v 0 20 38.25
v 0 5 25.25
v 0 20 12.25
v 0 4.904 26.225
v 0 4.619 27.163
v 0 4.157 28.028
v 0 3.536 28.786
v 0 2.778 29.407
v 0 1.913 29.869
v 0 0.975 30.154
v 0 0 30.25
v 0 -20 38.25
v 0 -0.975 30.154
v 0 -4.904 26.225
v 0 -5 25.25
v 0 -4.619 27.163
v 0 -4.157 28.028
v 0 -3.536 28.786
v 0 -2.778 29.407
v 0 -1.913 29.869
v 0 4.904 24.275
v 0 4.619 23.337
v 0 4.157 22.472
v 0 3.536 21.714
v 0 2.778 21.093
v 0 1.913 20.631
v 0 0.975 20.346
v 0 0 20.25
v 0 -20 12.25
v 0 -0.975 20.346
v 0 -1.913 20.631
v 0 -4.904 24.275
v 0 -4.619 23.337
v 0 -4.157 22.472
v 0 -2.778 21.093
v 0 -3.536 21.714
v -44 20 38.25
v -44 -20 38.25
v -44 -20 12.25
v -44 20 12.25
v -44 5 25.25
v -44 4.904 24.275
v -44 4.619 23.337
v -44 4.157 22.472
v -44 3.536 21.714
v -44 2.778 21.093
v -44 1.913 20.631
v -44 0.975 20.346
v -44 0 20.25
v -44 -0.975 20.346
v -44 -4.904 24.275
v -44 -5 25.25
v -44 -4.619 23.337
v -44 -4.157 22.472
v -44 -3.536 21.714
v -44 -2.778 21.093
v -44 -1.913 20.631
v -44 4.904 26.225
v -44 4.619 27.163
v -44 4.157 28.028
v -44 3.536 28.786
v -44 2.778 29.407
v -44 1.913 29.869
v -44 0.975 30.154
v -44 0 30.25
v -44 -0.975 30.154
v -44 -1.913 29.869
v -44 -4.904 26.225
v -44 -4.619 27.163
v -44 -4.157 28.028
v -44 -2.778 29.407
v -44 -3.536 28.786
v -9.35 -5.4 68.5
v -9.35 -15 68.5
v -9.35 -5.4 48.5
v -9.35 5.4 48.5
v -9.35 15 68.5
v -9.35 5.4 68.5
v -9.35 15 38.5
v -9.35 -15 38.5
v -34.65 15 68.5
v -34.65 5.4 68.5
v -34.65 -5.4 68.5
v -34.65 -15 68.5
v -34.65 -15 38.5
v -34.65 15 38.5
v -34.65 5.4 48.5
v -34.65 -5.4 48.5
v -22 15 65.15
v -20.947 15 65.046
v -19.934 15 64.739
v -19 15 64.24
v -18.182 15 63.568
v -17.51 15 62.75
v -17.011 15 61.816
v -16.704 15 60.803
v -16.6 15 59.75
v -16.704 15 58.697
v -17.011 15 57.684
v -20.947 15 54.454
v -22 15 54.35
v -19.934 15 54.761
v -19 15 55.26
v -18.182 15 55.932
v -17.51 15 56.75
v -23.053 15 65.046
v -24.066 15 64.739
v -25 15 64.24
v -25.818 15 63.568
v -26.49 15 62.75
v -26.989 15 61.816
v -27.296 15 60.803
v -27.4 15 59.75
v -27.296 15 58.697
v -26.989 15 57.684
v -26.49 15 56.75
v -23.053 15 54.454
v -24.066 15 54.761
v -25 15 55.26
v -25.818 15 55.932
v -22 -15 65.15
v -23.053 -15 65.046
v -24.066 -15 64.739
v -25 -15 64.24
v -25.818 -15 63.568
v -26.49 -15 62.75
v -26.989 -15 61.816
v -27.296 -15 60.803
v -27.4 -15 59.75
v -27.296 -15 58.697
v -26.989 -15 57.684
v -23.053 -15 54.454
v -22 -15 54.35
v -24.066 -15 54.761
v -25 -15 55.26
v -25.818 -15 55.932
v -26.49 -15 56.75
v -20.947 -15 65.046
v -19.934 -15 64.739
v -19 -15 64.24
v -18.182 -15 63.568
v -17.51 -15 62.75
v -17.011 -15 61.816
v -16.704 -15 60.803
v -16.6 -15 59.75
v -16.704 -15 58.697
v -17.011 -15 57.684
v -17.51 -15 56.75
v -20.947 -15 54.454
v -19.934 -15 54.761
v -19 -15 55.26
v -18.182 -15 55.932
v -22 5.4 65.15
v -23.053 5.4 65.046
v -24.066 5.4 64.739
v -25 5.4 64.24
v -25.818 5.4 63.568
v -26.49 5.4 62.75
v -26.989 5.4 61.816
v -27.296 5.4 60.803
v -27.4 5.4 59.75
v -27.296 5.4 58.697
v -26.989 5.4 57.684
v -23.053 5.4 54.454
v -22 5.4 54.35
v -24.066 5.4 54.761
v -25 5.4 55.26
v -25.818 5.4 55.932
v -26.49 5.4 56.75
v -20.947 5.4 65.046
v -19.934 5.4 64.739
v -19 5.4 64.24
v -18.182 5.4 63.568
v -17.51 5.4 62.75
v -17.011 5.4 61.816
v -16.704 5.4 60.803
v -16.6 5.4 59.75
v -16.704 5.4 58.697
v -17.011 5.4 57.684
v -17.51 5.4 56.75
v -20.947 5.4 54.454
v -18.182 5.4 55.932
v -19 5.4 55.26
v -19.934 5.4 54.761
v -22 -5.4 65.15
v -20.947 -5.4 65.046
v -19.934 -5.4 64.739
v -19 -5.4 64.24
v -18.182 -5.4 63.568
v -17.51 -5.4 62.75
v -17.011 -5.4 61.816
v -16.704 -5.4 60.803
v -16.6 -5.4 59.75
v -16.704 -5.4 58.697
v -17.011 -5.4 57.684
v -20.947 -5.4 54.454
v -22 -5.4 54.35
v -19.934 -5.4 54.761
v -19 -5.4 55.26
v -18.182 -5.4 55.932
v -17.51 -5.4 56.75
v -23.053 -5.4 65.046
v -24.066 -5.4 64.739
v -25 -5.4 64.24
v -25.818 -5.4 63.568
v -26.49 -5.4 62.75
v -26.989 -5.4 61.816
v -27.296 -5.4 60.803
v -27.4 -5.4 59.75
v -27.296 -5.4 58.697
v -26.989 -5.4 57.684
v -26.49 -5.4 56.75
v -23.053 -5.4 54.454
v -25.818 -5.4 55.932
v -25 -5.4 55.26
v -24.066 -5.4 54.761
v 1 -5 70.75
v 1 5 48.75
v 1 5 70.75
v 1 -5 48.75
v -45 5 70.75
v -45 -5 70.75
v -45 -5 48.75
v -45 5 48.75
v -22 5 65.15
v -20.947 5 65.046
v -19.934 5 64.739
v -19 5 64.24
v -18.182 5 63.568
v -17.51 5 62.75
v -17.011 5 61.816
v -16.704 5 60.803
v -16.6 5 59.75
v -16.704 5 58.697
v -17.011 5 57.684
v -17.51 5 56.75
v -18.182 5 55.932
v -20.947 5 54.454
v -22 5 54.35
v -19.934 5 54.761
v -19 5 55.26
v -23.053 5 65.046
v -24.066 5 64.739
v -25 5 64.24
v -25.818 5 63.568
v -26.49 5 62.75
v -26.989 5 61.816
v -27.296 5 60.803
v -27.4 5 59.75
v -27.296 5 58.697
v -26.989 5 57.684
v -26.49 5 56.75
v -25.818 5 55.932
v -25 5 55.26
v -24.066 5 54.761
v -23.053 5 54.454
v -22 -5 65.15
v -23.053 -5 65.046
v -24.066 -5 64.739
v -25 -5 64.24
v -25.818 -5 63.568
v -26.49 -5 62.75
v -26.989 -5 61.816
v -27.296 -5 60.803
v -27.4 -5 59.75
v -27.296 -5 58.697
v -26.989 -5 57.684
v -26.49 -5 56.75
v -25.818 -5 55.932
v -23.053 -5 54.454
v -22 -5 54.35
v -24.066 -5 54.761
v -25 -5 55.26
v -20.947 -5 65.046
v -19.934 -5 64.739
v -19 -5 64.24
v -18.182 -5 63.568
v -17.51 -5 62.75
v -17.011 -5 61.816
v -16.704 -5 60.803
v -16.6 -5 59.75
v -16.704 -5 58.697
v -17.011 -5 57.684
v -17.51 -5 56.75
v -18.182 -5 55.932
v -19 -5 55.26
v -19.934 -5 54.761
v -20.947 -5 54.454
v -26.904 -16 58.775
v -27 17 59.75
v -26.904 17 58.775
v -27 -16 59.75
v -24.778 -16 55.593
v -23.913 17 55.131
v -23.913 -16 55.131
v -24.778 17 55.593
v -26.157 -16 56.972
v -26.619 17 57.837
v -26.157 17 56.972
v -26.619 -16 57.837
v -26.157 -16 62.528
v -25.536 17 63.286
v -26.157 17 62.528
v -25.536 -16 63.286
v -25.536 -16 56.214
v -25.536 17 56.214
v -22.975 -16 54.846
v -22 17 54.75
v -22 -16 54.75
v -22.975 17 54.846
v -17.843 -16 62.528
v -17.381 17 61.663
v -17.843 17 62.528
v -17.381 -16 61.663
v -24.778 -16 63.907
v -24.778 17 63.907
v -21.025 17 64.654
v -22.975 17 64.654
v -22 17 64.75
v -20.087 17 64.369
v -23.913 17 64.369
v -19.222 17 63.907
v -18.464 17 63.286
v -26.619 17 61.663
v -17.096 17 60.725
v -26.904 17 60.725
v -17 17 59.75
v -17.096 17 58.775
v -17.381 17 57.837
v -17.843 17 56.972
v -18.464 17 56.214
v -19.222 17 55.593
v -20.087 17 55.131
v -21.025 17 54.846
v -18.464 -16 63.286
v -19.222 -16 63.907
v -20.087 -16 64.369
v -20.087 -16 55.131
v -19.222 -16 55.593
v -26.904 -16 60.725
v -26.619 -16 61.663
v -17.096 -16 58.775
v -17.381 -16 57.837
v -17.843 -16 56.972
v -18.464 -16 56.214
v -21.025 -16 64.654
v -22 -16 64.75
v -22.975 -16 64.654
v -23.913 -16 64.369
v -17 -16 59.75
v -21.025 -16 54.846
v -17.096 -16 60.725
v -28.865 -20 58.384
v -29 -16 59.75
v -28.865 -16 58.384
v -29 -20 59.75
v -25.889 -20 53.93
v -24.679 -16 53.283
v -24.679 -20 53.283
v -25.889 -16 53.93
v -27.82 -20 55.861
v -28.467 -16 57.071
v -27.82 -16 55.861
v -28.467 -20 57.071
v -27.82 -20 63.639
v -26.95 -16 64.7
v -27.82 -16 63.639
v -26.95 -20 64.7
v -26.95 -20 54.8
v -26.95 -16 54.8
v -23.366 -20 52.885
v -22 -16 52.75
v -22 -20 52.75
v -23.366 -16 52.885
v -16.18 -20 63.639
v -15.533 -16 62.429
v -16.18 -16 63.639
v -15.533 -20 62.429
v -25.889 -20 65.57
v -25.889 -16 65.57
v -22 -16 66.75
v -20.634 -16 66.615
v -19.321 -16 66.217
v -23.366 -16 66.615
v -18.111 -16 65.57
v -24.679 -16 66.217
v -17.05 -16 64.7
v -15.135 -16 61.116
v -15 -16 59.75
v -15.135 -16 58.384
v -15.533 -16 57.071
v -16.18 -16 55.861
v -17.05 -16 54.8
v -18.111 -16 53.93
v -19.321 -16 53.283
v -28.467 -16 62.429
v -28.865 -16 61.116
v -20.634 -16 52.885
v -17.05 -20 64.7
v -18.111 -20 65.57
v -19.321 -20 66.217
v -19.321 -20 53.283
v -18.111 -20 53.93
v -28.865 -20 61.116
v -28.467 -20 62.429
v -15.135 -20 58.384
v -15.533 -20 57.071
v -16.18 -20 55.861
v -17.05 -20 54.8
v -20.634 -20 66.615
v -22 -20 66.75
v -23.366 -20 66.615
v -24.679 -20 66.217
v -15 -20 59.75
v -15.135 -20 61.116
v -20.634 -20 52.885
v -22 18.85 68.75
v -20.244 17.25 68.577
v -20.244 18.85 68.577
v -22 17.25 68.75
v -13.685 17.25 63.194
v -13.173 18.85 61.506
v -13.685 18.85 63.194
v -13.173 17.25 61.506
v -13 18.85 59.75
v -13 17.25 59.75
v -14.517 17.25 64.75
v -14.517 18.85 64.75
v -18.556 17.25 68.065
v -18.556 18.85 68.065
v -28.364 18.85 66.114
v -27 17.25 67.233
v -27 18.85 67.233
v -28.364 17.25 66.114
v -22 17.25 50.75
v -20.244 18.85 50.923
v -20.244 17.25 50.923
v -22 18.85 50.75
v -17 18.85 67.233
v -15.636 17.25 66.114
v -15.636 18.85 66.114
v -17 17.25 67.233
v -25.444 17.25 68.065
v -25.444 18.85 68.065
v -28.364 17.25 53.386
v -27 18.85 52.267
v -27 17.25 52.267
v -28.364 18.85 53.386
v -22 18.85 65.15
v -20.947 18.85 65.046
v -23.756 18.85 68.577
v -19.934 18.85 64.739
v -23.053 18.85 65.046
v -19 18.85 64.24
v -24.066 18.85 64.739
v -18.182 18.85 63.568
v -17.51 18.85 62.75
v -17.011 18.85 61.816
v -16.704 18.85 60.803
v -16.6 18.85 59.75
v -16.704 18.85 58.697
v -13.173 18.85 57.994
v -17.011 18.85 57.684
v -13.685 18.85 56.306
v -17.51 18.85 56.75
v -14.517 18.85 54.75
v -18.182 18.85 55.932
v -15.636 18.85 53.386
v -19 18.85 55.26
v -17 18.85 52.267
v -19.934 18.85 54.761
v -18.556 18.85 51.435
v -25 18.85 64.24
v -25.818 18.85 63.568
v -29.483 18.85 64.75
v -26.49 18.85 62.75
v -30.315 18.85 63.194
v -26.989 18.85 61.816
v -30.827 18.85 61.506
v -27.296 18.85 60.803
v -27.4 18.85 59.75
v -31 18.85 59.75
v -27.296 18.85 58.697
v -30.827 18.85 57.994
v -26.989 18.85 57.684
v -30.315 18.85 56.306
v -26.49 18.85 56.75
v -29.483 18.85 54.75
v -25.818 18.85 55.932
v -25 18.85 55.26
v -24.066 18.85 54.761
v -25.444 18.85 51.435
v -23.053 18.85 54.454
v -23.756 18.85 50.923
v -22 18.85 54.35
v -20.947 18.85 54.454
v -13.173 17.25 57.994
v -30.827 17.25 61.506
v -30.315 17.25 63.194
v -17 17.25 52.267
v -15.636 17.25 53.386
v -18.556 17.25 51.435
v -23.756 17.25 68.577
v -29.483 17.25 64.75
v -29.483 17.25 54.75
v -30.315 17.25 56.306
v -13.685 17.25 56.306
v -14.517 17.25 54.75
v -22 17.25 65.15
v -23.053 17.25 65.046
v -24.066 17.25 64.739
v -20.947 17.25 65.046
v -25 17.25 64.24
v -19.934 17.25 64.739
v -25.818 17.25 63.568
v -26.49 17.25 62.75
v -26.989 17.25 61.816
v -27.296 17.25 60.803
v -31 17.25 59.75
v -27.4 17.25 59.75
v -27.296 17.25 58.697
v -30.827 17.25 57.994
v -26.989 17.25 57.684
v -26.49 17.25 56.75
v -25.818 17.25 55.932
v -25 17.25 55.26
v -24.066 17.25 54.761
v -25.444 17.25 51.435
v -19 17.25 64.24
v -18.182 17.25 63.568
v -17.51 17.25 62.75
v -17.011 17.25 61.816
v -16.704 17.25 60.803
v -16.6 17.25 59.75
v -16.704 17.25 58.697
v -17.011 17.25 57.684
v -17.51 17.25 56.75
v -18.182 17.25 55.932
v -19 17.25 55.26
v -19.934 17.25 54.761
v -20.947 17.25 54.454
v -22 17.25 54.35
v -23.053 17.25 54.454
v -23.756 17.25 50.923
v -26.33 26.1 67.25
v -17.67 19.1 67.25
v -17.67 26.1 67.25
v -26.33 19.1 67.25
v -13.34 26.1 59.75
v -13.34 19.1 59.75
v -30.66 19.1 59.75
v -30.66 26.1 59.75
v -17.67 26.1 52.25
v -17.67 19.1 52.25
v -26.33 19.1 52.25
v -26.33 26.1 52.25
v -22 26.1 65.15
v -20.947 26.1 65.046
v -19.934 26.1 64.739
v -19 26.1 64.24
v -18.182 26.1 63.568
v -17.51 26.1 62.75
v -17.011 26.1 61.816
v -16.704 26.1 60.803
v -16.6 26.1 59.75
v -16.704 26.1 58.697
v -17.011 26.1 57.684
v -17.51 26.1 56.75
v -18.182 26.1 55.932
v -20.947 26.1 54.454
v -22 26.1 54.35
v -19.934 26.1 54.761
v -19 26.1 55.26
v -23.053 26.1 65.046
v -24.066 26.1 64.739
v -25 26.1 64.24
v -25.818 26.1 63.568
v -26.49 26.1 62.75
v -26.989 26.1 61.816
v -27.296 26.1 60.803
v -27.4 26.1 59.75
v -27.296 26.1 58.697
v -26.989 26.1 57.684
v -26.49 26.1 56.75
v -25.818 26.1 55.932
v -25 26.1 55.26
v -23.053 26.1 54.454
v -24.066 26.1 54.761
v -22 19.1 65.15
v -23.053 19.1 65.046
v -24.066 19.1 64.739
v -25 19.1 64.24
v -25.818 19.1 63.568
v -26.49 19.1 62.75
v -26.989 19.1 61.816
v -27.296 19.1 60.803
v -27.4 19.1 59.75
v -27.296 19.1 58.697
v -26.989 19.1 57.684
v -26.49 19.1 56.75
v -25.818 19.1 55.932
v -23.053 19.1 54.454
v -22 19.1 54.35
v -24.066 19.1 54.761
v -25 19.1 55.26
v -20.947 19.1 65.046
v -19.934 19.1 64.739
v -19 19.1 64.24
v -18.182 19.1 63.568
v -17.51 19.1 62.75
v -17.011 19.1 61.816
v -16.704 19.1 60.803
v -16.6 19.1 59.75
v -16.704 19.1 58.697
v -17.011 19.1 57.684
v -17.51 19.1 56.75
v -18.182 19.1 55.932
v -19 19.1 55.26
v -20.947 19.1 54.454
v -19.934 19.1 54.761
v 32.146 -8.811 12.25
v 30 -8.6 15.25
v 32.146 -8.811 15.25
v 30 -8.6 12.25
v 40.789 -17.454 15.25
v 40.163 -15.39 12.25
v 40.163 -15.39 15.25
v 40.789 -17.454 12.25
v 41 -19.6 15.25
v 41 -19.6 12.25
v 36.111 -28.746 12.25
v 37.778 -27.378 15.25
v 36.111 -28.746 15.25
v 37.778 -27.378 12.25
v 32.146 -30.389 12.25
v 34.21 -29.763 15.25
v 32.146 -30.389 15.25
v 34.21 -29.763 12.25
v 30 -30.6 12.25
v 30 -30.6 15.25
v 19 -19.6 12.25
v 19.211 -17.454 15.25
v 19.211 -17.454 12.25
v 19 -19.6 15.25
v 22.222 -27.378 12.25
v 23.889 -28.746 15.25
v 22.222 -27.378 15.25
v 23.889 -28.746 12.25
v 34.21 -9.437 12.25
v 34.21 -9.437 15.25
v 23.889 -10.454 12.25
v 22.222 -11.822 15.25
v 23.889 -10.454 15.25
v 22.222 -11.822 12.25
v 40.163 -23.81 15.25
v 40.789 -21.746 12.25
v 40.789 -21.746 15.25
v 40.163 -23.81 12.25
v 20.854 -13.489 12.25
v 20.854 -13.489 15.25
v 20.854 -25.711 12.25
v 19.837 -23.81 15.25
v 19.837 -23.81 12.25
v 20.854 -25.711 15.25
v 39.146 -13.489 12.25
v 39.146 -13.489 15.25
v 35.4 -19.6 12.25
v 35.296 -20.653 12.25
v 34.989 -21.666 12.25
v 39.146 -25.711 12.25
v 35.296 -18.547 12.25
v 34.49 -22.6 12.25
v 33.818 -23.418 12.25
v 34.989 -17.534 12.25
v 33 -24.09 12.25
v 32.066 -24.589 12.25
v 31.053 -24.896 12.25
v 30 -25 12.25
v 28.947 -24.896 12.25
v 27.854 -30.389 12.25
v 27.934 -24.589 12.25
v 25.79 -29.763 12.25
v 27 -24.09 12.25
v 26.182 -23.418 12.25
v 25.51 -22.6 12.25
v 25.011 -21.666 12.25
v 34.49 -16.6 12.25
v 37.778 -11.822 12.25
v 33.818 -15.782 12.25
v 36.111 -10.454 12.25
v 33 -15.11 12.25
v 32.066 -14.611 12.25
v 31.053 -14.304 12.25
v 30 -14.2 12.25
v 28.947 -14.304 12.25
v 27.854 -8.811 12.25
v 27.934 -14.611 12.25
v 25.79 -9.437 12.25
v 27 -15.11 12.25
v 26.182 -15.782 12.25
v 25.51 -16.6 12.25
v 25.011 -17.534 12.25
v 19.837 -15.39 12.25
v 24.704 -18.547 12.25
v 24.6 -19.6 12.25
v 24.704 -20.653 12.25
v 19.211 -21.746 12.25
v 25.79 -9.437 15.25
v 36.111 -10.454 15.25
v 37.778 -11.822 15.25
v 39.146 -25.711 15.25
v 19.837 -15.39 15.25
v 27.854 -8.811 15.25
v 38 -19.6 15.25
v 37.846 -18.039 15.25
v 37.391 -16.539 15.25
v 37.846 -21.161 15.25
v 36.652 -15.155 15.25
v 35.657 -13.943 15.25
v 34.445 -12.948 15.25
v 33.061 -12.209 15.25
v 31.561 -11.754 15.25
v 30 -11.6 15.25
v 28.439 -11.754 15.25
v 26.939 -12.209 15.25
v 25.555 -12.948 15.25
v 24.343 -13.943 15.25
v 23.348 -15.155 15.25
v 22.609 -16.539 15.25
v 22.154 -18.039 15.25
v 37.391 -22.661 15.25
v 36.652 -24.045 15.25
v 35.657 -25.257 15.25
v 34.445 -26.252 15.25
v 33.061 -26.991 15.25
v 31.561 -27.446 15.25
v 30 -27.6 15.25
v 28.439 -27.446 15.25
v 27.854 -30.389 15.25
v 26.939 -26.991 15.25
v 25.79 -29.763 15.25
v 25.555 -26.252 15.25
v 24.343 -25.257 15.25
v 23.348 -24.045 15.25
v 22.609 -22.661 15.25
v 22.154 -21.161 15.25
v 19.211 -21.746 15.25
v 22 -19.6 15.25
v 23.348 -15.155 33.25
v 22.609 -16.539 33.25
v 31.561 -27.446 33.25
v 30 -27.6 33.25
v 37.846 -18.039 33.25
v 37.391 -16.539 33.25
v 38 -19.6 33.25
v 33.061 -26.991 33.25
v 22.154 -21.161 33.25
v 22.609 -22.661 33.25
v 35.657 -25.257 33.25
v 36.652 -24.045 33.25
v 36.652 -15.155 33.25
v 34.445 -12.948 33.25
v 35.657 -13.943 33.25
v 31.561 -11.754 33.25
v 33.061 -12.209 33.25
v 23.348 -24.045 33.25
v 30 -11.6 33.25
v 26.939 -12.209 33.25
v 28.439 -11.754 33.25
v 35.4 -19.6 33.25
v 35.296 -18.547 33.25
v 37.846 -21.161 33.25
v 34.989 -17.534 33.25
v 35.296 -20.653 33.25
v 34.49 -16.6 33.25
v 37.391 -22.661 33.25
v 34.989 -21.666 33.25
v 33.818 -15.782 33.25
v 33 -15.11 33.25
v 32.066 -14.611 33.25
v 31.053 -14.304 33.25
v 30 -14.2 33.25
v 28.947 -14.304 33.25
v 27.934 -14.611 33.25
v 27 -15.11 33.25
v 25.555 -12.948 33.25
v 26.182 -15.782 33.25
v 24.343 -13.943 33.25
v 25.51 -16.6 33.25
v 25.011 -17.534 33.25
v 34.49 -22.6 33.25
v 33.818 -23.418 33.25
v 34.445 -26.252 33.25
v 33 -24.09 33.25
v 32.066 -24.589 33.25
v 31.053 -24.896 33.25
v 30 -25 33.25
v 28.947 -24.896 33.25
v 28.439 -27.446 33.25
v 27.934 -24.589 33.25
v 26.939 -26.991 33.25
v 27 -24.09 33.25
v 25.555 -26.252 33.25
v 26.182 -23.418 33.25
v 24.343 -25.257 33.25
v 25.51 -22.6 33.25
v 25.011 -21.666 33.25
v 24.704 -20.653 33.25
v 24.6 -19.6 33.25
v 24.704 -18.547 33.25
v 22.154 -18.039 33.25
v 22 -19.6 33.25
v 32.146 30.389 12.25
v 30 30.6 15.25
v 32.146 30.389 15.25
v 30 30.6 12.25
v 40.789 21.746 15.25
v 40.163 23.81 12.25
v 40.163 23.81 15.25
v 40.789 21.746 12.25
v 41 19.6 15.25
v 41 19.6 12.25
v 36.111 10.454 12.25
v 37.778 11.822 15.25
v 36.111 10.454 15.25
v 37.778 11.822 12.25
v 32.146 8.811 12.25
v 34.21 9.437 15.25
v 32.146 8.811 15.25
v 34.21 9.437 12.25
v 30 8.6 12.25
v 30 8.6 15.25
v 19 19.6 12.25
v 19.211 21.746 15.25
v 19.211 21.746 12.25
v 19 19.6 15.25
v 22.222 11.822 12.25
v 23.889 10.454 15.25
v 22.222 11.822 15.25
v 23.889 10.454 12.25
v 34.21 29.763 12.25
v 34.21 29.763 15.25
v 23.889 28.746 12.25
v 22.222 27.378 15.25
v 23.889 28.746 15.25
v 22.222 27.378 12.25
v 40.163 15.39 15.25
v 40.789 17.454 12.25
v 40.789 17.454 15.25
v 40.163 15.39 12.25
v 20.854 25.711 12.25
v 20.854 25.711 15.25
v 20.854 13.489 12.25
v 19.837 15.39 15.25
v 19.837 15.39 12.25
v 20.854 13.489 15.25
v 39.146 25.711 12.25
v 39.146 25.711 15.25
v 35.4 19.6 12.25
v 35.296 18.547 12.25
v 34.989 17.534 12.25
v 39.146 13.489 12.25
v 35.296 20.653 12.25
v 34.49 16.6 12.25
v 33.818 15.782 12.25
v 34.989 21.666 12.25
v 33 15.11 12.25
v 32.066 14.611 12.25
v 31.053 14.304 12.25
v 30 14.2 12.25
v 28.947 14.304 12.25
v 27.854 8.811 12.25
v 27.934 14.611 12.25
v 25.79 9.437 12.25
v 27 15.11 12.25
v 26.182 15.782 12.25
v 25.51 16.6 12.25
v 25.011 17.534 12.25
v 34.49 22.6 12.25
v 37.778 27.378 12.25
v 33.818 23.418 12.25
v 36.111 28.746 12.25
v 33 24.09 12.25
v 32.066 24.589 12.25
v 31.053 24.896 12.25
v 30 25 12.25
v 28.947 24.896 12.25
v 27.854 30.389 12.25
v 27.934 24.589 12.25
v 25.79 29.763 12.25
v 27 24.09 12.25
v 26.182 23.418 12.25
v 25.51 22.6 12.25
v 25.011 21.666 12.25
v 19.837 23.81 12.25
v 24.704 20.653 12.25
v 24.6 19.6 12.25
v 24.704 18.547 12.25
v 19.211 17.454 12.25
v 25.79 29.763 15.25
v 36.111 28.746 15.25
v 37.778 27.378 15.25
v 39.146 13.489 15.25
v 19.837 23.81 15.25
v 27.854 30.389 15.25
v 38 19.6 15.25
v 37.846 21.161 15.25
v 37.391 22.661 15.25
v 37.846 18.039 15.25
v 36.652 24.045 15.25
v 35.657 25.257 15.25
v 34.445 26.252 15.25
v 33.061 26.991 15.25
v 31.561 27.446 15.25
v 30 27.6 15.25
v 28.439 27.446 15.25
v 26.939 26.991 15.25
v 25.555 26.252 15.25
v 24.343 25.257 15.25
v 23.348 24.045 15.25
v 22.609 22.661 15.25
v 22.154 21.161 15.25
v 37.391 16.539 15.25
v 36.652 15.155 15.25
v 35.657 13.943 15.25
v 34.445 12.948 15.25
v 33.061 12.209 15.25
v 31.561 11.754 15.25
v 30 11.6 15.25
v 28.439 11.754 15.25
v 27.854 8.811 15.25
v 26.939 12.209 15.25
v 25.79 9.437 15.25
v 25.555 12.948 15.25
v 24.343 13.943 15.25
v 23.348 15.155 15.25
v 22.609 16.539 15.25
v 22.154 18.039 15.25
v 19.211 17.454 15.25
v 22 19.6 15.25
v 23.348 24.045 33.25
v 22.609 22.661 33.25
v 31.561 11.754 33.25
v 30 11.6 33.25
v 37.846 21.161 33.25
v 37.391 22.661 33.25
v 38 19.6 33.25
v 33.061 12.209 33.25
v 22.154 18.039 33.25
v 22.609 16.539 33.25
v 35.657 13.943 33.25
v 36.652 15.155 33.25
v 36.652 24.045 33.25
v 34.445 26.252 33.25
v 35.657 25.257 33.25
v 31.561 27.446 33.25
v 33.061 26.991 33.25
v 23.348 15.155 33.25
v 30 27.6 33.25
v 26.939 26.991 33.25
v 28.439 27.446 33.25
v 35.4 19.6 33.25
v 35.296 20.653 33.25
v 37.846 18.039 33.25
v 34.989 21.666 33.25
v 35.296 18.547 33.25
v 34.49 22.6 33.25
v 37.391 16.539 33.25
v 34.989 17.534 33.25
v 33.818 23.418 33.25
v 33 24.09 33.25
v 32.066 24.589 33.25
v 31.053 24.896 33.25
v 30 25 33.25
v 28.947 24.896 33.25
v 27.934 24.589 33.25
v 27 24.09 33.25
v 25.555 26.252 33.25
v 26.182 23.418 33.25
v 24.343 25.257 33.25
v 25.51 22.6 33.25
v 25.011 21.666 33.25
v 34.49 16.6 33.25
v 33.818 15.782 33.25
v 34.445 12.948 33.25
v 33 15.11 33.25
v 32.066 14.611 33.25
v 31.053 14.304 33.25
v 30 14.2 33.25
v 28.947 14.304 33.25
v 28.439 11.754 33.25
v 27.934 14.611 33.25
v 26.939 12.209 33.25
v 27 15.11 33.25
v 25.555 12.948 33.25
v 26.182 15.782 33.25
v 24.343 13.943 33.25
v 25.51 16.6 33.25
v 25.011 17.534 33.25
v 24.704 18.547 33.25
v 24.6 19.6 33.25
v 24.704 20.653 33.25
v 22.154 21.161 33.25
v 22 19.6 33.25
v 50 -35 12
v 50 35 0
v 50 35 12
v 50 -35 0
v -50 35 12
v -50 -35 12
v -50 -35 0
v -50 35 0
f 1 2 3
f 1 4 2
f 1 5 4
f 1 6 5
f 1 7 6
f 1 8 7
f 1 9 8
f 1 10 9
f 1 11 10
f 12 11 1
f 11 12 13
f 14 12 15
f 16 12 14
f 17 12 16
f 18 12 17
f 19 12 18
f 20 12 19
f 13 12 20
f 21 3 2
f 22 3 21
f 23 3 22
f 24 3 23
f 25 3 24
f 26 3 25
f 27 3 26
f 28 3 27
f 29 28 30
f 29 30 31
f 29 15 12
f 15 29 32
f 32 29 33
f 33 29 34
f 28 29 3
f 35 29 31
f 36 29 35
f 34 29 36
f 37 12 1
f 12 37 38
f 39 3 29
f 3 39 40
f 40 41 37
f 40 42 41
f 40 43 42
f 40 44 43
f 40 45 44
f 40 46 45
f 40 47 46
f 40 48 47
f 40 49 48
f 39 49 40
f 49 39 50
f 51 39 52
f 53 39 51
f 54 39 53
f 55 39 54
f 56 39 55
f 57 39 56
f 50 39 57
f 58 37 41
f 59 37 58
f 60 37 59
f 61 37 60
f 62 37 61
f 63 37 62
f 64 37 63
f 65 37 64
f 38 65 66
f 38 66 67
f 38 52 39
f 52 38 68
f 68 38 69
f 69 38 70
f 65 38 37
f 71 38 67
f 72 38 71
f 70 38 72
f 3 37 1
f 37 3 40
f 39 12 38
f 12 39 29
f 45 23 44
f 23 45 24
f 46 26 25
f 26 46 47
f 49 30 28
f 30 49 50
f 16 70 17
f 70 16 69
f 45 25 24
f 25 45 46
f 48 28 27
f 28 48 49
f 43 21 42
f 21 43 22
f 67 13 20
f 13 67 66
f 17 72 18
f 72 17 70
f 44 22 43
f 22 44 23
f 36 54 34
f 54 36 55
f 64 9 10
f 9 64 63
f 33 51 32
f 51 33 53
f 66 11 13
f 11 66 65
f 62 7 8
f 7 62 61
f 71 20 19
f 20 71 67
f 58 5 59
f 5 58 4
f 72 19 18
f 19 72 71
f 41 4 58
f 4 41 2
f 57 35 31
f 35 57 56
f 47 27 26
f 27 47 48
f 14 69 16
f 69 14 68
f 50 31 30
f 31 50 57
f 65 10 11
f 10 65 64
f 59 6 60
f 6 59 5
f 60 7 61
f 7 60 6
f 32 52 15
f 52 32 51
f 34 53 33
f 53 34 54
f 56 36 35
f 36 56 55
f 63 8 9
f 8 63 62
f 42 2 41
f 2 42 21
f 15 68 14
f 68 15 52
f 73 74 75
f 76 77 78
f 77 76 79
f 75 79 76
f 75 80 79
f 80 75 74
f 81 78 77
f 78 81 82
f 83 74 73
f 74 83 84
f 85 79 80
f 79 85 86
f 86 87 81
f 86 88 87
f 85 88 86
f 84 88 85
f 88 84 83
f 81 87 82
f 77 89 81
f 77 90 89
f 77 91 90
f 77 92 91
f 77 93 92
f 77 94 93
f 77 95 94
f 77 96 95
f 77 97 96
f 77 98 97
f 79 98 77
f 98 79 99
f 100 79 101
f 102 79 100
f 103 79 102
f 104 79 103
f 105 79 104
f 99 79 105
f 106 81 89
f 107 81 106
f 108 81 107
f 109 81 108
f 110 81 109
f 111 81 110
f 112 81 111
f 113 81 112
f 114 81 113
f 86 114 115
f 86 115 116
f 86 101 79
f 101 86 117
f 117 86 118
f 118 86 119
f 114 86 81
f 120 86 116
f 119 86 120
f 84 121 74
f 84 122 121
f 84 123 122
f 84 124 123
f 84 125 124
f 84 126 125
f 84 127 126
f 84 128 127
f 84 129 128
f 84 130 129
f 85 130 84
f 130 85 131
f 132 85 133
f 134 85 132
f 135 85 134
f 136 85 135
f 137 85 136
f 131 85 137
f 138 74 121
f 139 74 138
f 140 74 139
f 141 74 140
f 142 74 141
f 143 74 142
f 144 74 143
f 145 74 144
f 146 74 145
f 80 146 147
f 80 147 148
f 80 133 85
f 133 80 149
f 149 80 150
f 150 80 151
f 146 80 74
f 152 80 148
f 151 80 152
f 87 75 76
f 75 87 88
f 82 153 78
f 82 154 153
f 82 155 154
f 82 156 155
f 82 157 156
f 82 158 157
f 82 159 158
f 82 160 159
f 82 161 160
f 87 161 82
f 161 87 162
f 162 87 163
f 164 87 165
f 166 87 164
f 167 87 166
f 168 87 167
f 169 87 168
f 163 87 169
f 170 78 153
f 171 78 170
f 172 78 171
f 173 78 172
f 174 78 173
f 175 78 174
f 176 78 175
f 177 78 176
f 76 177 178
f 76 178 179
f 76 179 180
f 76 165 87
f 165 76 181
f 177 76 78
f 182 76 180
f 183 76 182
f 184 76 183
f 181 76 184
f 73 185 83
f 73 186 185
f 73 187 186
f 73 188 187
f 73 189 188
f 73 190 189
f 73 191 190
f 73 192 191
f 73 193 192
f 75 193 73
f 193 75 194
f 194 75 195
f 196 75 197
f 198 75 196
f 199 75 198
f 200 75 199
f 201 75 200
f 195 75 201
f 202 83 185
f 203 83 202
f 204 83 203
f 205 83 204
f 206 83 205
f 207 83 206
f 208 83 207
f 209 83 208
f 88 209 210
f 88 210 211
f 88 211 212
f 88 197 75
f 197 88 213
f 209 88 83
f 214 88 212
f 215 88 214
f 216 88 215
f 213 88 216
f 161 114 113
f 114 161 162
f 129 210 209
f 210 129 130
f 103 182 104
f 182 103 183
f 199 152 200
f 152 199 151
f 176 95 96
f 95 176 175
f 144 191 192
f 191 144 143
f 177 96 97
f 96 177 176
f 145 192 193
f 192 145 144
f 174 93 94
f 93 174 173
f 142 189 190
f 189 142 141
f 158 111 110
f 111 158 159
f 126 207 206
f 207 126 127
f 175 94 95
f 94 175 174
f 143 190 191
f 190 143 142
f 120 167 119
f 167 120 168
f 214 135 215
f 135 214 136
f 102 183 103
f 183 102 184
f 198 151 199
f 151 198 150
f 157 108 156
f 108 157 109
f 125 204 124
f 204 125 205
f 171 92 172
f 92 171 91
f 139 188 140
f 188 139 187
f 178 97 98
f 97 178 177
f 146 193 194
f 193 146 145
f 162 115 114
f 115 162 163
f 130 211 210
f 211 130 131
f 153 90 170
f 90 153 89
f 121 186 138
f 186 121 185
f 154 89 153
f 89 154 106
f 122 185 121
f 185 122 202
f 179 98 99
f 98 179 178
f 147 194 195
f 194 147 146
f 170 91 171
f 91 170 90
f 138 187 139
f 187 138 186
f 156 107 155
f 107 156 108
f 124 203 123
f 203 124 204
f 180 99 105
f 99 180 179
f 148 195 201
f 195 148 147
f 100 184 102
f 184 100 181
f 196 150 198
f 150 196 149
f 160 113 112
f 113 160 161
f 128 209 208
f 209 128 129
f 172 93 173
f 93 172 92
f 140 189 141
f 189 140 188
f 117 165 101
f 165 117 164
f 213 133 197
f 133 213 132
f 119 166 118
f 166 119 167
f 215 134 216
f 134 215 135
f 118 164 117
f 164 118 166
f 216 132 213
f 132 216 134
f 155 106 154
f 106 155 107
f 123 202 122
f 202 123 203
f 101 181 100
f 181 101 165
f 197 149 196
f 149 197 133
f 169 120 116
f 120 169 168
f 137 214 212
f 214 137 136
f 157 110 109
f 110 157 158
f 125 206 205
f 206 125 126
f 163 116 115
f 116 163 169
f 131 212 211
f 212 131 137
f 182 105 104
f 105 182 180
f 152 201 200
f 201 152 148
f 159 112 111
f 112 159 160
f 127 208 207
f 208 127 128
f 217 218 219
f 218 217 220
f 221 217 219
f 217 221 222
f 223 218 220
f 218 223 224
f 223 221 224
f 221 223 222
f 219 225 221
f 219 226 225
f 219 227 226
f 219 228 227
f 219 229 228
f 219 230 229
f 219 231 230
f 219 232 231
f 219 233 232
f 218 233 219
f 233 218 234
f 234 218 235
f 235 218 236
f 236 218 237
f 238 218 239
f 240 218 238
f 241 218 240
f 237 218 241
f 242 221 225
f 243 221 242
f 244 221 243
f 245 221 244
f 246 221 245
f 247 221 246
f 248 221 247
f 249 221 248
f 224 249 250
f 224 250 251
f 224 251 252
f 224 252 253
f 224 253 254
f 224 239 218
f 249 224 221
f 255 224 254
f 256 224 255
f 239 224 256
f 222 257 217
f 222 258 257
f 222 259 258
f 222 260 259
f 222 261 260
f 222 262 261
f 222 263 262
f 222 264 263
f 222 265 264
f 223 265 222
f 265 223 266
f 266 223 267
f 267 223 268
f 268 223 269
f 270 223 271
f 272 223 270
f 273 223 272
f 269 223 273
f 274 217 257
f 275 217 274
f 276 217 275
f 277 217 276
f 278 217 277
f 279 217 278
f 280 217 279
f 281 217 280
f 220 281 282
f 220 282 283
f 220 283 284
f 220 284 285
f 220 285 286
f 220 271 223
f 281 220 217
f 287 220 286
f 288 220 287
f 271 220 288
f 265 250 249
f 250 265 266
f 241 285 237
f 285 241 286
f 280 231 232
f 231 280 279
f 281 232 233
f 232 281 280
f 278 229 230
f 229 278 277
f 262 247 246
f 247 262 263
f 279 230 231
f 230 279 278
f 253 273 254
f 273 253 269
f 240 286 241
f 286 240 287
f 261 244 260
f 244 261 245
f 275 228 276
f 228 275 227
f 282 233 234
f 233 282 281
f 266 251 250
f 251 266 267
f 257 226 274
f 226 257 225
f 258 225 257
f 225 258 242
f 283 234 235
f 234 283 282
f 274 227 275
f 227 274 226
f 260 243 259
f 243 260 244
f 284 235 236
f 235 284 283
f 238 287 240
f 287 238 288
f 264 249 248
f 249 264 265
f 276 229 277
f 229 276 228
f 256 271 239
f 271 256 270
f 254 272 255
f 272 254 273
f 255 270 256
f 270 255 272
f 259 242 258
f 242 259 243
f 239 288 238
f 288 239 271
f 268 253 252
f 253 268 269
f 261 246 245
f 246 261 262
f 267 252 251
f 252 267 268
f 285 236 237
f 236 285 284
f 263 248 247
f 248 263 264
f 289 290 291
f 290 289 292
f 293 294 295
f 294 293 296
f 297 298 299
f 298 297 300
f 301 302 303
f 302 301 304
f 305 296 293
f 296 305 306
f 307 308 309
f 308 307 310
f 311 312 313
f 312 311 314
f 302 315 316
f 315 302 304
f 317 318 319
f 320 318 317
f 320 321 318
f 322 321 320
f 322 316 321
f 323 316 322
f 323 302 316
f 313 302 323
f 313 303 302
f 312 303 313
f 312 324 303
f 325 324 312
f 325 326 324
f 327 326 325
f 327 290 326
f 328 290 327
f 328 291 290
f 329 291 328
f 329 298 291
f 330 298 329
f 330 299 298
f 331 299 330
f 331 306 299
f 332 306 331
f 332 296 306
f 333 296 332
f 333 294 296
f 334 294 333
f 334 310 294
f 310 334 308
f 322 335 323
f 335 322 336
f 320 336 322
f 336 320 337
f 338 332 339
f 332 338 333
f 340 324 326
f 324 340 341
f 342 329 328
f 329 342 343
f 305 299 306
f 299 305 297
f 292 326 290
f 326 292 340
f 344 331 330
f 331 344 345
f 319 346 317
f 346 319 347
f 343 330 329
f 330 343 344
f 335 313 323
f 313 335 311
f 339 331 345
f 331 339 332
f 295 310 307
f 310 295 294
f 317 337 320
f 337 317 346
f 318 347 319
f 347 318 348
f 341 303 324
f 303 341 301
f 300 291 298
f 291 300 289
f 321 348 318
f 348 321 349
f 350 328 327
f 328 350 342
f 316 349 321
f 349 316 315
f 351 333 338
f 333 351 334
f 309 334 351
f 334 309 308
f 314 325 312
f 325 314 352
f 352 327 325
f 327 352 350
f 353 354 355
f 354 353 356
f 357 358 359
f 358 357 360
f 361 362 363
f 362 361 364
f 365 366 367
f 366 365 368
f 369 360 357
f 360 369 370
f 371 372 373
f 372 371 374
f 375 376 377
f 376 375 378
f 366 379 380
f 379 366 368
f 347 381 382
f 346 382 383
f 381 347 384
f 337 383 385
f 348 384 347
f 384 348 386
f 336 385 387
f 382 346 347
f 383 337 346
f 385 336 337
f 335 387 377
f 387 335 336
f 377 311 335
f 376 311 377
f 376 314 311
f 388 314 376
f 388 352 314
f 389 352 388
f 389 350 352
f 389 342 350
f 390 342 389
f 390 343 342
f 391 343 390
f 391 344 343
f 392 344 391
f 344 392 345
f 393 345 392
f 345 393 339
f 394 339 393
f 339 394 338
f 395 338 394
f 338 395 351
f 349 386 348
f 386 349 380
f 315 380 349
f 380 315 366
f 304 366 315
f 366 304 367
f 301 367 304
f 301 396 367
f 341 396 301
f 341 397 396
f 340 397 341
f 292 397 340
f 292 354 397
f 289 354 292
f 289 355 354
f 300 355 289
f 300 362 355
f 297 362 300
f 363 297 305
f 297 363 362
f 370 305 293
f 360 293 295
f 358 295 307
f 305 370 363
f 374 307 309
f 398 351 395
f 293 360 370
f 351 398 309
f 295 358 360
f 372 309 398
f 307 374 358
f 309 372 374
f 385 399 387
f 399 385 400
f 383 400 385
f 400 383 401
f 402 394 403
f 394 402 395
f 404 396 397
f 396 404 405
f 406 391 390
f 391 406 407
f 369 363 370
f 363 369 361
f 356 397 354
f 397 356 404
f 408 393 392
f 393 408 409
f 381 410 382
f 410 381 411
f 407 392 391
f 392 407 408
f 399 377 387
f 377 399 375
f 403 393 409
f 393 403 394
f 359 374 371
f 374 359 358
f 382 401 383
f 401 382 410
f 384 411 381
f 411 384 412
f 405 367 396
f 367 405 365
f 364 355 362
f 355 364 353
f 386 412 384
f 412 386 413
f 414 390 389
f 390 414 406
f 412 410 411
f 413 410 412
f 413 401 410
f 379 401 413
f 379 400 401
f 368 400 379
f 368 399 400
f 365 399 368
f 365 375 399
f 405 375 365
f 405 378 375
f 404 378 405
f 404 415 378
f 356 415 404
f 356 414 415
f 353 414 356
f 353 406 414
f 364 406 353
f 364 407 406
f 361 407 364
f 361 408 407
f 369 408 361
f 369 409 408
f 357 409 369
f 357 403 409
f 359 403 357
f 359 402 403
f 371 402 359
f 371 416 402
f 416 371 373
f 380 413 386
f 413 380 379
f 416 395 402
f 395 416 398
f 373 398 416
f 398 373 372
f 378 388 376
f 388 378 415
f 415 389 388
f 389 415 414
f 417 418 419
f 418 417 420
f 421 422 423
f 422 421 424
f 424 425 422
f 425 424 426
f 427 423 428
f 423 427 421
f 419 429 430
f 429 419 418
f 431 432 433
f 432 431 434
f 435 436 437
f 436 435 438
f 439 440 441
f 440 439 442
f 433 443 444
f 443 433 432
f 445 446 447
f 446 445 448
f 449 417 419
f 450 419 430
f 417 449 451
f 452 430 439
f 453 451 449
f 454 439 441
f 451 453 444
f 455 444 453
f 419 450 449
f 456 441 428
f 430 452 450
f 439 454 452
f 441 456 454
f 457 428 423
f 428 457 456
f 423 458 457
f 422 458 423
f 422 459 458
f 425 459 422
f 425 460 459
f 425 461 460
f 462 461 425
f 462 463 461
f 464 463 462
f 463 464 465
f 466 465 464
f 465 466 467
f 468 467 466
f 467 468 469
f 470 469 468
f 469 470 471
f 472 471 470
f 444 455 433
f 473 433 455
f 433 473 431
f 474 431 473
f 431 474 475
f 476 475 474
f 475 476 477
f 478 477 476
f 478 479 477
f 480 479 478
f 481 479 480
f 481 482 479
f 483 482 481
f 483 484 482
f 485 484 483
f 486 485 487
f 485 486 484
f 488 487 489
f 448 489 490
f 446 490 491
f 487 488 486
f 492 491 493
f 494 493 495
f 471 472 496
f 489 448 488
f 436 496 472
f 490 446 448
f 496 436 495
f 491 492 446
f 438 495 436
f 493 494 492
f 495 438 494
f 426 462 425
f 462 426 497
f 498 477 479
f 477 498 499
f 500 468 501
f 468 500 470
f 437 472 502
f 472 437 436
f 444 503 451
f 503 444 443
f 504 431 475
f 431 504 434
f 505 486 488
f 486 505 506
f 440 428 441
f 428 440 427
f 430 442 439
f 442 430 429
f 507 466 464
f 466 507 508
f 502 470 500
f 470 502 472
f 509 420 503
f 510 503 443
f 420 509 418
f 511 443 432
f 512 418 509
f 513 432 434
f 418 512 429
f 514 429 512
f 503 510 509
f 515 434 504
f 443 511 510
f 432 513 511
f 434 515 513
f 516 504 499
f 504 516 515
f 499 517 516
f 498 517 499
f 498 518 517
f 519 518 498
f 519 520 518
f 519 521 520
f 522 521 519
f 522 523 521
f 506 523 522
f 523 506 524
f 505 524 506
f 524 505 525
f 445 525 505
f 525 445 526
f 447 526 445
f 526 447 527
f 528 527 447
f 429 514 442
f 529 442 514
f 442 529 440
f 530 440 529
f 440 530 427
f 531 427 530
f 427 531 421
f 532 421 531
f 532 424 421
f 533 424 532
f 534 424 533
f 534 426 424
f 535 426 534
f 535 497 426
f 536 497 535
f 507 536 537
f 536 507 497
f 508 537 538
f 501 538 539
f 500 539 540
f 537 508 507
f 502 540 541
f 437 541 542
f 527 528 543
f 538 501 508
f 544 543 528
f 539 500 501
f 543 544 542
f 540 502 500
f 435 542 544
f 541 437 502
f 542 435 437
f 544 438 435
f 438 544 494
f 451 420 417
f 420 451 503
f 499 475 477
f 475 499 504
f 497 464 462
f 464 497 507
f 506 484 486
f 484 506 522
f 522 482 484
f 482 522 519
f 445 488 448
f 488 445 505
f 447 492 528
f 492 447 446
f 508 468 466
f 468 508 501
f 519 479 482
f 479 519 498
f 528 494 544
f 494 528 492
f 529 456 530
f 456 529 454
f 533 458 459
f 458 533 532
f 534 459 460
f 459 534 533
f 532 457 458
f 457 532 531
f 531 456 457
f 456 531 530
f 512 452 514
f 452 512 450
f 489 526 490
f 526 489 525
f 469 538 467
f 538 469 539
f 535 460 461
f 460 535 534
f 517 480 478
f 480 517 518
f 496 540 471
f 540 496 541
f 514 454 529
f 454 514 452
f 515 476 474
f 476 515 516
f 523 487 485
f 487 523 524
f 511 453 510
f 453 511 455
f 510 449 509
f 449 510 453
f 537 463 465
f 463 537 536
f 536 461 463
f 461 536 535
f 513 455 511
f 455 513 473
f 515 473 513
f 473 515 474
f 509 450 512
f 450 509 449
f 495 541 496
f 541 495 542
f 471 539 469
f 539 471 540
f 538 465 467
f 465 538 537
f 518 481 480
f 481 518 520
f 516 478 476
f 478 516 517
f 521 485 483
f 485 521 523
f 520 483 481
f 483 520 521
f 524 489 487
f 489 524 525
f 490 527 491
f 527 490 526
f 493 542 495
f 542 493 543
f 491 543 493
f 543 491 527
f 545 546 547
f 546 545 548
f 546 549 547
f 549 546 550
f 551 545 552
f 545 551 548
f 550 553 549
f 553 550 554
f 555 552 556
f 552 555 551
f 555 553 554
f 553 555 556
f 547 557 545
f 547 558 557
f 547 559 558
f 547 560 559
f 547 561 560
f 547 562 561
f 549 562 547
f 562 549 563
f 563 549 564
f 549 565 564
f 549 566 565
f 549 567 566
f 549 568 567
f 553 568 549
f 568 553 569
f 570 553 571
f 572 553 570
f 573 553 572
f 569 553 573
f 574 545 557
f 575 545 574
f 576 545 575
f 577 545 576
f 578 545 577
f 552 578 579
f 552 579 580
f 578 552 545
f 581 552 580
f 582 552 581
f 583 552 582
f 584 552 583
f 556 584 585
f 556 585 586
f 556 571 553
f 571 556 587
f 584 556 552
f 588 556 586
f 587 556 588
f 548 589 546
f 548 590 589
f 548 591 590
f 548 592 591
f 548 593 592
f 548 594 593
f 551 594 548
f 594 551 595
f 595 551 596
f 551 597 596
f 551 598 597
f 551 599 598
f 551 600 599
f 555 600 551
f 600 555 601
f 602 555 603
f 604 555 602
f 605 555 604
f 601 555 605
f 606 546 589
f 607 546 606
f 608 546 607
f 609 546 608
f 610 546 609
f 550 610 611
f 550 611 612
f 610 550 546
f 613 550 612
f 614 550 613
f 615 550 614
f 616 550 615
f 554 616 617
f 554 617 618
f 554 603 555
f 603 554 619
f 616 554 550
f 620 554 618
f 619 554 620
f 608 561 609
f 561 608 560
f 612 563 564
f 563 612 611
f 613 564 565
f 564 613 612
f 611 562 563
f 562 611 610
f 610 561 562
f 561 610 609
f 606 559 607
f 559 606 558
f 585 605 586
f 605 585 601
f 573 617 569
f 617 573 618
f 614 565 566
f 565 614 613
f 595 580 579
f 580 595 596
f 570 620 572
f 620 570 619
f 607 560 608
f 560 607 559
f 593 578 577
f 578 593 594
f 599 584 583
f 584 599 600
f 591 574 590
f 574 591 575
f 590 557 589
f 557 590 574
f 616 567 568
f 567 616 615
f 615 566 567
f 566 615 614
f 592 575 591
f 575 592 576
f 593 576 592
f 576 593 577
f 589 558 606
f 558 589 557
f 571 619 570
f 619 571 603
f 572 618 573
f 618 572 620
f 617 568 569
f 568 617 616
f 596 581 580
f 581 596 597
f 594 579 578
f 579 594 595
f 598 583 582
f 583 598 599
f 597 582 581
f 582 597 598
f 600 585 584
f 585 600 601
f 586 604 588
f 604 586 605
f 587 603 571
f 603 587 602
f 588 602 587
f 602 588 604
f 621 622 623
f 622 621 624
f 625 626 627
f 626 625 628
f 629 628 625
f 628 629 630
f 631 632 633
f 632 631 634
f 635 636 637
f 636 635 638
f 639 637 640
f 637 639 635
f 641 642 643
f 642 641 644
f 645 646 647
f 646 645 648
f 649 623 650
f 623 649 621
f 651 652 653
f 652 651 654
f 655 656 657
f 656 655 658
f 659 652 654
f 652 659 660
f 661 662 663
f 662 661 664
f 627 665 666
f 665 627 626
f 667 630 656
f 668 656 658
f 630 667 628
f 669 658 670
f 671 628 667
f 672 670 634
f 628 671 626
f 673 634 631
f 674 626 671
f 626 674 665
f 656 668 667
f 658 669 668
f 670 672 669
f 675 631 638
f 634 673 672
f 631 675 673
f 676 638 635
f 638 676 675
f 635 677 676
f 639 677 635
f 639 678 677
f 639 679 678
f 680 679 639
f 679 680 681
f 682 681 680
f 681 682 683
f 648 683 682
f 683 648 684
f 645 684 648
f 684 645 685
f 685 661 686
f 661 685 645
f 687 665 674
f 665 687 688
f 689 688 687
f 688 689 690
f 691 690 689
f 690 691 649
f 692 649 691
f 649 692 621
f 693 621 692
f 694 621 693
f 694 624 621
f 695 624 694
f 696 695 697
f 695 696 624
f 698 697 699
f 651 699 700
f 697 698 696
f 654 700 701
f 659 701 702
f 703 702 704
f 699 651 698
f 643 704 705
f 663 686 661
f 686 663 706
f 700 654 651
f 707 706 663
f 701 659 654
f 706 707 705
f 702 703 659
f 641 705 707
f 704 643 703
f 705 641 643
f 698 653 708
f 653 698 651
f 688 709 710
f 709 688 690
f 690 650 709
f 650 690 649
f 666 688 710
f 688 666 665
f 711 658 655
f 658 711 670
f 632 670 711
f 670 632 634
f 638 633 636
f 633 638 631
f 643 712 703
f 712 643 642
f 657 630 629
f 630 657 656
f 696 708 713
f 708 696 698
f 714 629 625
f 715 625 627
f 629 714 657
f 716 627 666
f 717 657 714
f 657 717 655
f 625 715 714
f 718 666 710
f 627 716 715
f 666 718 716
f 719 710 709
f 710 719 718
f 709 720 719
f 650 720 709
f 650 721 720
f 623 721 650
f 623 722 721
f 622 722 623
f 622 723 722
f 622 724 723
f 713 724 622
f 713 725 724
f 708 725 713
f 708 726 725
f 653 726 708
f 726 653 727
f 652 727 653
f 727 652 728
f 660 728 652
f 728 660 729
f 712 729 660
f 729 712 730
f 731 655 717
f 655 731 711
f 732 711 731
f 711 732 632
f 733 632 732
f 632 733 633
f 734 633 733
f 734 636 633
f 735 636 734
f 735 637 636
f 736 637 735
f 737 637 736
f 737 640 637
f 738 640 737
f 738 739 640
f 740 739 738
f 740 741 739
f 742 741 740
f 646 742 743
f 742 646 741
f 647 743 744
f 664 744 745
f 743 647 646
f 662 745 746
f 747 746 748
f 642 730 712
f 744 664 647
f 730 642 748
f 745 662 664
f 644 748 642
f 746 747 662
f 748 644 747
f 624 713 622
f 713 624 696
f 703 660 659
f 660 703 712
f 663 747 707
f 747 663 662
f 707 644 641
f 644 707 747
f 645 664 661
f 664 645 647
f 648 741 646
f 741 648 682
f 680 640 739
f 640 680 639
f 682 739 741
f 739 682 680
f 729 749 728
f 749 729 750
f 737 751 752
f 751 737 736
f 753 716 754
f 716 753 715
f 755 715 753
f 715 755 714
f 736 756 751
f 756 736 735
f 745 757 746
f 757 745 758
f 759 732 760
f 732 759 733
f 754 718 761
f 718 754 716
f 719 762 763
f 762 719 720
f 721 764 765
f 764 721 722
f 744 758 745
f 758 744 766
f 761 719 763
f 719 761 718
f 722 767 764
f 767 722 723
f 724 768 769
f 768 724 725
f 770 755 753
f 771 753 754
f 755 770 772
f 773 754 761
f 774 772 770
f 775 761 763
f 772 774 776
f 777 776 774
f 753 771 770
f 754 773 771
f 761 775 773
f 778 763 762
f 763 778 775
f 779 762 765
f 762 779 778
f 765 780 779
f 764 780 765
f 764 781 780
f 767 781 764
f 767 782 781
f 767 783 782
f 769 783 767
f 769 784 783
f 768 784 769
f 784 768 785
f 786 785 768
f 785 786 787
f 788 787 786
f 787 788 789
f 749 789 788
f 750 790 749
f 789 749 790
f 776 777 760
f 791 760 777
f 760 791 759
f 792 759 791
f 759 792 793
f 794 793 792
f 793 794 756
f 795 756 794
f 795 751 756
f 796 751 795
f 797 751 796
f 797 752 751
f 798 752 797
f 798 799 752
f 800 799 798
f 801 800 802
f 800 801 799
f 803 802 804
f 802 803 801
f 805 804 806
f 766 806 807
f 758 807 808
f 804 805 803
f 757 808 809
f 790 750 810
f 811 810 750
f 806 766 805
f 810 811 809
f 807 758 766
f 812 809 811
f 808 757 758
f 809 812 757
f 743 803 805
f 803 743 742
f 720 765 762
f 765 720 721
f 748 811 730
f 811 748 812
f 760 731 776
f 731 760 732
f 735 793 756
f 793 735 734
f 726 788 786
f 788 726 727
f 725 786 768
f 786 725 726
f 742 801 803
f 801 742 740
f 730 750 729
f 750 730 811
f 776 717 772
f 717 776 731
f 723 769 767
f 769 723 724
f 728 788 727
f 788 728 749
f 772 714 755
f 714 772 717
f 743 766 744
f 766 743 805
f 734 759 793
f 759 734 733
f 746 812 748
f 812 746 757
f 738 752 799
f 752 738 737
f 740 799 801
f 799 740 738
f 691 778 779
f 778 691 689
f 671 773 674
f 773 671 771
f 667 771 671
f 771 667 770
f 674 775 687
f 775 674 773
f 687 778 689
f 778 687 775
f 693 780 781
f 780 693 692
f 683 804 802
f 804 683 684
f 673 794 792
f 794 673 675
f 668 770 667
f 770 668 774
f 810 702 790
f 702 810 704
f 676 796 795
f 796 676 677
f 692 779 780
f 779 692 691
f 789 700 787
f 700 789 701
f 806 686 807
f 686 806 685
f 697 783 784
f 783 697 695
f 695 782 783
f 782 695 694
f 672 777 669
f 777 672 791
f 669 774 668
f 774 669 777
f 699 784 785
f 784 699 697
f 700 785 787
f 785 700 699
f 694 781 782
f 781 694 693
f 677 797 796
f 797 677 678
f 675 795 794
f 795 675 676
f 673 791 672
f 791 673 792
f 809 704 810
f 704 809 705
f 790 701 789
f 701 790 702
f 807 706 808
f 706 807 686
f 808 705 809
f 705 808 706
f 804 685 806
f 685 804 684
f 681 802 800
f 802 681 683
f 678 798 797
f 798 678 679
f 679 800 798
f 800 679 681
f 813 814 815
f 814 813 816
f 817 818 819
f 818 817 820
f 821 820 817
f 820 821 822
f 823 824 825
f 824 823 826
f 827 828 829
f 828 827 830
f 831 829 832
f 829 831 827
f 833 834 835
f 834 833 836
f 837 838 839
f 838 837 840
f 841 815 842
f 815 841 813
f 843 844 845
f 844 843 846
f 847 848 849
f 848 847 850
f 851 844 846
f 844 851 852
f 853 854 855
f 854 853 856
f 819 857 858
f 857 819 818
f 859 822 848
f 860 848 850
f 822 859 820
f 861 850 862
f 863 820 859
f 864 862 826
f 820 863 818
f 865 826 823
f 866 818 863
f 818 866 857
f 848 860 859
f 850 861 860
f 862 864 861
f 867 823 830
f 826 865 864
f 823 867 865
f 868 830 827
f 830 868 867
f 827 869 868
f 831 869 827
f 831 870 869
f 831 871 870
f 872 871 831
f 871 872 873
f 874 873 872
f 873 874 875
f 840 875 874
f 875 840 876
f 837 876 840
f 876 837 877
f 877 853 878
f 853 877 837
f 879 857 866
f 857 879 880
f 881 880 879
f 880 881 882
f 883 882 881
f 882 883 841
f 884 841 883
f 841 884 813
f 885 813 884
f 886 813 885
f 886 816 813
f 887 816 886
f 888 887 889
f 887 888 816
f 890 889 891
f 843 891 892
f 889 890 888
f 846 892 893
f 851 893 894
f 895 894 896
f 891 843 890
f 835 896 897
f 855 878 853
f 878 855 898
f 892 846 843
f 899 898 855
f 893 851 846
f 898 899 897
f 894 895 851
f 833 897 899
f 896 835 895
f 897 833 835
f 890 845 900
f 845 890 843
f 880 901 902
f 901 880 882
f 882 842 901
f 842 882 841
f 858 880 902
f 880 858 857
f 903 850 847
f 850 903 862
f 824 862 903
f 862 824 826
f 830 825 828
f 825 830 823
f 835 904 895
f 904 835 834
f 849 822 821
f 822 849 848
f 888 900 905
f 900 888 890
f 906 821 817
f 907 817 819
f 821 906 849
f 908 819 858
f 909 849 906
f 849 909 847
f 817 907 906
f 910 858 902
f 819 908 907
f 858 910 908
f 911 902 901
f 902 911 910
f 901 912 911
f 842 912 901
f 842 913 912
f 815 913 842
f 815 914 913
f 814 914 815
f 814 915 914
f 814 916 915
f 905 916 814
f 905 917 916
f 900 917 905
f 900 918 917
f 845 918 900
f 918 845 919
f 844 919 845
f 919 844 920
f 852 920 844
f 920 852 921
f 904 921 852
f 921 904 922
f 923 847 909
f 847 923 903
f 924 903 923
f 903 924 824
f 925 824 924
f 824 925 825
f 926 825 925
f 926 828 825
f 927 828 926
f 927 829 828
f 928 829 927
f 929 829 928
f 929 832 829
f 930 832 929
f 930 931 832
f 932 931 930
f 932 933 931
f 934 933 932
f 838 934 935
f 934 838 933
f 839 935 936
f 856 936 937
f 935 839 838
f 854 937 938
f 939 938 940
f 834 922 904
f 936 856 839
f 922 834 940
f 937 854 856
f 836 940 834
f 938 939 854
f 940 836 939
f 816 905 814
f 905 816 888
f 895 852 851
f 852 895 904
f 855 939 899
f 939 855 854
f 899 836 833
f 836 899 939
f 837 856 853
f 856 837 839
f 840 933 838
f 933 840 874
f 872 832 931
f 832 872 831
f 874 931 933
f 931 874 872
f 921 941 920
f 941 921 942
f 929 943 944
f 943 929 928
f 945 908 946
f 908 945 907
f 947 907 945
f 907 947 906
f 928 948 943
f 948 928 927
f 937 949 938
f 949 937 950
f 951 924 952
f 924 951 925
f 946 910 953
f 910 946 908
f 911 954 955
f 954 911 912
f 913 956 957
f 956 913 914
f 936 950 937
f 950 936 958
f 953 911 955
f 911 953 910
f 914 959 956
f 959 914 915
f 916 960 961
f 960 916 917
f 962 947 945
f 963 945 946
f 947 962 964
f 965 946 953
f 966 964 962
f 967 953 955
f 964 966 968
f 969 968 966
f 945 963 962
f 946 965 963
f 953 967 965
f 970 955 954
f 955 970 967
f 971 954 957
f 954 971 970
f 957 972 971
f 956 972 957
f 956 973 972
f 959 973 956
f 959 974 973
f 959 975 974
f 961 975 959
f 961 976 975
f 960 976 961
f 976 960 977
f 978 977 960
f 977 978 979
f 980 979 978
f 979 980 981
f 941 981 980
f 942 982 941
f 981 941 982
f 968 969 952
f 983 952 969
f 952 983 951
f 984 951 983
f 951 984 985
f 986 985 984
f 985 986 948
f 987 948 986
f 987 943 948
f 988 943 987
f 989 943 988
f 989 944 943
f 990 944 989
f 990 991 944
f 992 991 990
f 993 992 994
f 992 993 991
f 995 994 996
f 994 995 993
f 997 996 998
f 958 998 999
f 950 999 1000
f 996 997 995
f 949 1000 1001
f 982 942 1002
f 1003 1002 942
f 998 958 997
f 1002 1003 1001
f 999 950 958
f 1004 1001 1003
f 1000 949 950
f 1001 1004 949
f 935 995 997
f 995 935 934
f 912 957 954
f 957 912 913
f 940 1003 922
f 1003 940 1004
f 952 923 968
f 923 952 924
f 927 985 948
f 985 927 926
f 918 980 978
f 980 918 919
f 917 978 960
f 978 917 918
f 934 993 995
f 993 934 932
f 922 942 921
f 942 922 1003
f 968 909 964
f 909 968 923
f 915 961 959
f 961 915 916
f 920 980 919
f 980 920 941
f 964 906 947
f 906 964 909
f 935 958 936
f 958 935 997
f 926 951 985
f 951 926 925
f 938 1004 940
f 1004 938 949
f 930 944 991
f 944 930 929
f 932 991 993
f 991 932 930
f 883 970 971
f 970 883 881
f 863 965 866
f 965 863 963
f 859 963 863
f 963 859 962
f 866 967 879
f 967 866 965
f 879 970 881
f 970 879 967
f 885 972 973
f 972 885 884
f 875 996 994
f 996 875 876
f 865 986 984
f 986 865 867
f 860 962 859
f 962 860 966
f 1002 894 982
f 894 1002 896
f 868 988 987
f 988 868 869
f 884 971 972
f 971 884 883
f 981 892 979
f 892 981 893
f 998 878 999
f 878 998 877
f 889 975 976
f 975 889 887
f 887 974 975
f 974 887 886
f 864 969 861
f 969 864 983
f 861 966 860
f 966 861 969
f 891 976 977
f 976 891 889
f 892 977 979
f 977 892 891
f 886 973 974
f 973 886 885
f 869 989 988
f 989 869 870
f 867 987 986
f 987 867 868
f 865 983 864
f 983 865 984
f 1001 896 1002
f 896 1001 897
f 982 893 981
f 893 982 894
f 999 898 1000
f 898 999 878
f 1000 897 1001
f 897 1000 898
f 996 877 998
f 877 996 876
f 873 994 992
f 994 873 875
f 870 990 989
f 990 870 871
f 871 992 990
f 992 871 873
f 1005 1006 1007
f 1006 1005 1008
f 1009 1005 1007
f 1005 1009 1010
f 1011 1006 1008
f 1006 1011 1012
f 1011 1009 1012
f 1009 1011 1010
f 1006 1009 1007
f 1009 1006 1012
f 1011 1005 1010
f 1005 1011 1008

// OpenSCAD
$fn = 32;

// ------------------------------------------------------------------------
// Indexing jig: plate 100 x 70 mm, pin d10
// Every part is its own module, assembly() places every instance.
// ------------------------------------------------------------------------

// --- part 1 ---
module jig_plate() {
  difference() {
    translate([-50, -35, 0]) cube([100, 70, 12]);
  }
}

// --- part 2 ---
module locator_block() {
  difference() {
    translate([-22, -20, 0]) cube([44, 40, 26]);
    translate([0, 0, 13]) rotate([0, 90, 0]) cylinder(h = 46, d = 10, center = true);
  }
}

// --- part 3 ---
module index_fork() {
  difference() {
    translate([-12.65, -15, 0]) cube([25.3, 30, 30]);
    translate([-13.65, -5.4, 10]) cube([27.3, 10.8, 21]);
    translate([0, 0, 21.25]) rotate([90, 0, 0]) cylinder(h = 32, d = 10.8, center = true);
  }
}

// --- part 4 ---
module index_arm() {
  difference() {
    translate([-23, -5, 0]) cube([46, 10, 22]);
    translate([0, 0, 11]) rotate([90, 0, 0]) cylinder(h = 12, d = 10.8, center = true);
  }
}

// --- part 5 ---
module index_pin() {
  rotate([0, 90, 0]) cylinder(h = 34, d = 10, center = true);
  translate([-20, 0, 0]) rotate([0, 90, 0]) cylinder(h = 4, d = 14);
}

// --- part 6 ---
module pin_washer() {
  difference() {
      translate([0, 0, 0]) cylinder(h = 1.6, d = 18);
      translate([0, 0, -1]) cylinder(h = 3.6, d = 10.8);
    }
}

// --- part 7 ---
module lock_nut() {
  difference() {
    linear_extrude(height = 7) polygon(points = [[8.66, 0], [4.33, 7.5], [-4.33, 7.5], [-8.66, 0], [-4.33, -7.5], [4.33, -7.5]]);
    translate([0, 0, -1]) cylinder(h = 9, d = 10.8);
  }
}

// --- part 8 ---
module guide_bush_a() {
  difference() {
    union() {
      cylinder(h = 3, d = 22);
      translate([0, 0, 3]) cylinder(h = 18, d = 16);
    }
    translate([0, 0, -1]) cylinder(h = 23, d = 10.8);
  }
}

// --- part 9 ---
module guide_bush_b() {
  difference() {
    union() {
      cylinder(h = 3, d = 22);
      translate([0, 0, 3]) cylinder(h = 18, d = 16);
    }
    translate([0, 0, -1]) cylinder(h = 23, d = 10.8);
  }
}

// --- assembly ---
module assembly() {
  color([0.80, 0.24, 0.20]) translate([0, 0, 0]) rotate([0, 0, 0]) jig_plate();
  color([0.20, 0.45, 0.75]) translate([-22, 0, 12.25]) rotate([0, 0, 0]) locator_block();
  color([0.25, 0.62, 0.32]) translate([-22, 0, 38.5]) rotate([0, 0, 0]) index_fork();
  color([0.92, 0.70, 0.18]) translate([-22, 0, 48.75]) rotate([0, 0, 0]) index_arm();
  color([0.58, 0.35, 0.70]) translate([-22, 0, 59.75]) rotate([0, 0, 90]) index_pin();
  color([0.16, 0.66, 0.66]) translate([-22, 18.85, 59.75]) rotate([90, 0, 0]) pin_washer();
  color([0.85, 0.48, 0.18]) translate([-22, 26.1, 59.75]) rotate([90, 0, 0]) lock_nut();
  color([0.55, 0.60, 0.65]) translate([30, -19.6, 12.25]) rotate([0, 0, 0]) guide_bush_a();
  color([0.75, 0.30, 0.55]) translate([30, 19.6, 12.25]) rotate([0, 0, 0]) guide_bush_b();
}

assembly();
